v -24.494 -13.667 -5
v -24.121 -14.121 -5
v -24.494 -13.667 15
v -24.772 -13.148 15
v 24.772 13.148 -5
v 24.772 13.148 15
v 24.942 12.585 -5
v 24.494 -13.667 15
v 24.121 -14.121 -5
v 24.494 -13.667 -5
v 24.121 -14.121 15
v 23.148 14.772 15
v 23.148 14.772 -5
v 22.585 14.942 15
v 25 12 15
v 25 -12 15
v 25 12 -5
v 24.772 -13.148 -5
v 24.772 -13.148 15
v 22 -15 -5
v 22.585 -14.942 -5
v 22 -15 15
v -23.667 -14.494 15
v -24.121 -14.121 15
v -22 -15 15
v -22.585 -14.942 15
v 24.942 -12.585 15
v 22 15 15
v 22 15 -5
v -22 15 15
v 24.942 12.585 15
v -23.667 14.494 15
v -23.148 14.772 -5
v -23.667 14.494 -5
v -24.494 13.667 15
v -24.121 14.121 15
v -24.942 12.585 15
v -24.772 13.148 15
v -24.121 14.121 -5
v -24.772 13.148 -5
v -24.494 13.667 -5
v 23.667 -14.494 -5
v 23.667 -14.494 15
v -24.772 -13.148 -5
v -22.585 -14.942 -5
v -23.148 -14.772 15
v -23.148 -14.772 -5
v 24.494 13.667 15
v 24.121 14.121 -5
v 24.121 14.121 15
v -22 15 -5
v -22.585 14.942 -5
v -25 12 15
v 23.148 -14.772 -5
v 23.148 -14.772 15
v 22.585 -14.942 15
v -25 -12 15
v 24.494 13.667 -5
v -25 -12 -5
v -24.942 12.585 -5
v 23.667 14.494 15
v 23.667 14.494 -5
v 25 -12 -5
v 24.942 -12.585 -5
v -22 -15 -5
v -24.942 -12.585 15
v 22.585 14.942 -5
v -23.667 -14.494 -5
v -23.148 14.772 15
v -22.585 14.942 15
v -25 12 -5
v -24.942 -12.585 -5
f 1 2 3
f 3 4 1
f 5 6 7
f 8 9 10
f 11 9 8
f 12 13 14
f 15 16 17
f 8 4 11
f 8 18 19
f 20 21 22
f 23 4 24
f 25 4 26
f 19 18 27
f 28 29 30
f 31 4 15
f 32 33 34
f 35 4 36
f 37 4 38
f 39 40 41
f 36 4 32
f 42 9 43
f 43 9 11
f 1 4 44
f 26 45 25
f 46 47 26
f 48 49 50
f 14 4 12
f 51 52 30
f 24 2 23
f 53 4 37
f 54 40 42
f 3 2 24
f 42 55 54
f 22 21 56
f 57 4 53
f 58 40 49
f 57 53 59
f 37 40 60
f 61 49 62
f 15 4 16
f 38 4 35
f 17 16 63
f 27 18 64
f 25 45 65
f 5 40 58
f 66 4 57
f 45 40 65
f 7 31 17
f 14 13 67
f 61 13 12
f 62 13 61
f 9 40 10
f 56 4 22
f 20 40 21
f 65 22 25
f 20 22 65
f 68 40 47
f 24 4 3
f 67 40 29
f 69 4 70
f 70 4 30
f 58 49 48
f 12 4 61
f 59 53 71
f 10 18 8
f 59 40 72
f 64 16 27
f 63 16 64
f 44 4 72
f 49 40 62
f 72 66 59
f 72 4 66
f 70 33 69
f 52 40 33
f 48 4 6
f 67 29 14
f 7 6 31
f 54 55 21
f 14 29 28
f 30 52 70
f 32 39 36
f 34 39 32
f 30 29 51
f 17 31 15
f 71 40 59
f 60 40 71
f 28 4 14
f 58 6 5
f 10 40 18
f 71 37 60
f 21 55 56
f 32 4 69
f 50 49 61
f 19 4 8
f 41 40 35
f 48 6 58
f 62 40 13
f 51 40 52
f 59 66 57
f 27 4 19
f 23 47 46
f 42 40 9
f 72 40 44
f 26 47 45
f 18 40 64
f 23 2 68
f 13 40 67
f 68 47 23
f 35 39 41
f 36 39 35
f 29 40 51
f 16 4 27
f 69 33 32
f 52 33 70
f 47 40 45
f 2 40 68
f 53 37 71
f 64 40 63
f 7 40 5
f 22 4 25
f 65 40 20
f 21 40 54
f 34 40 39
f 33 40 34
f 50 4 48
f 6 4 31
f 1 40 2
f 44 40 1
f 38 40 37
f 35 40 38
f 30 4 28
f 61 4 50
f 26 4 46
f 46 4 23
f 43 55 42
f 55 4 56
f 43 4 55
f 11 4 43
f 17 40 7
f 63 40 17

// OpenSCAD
// Example: Parametric rounded box in OpenSCAD
// Render with: openscad -o models/stl/rounded_box.stl examples/openscad_demo.scad

width = 50;
depth = 30;
height = 20;
corner_radius = 3;

module rounded_box(w, d, h, r) {
    minkowski() {
        cube([w - 2*r, d - 2*r, h/2], center=true);
        cylinder(r=r, h=h/2, $fn=32);
    }
}

rounded_box(width, depth, height, corner_radius);
